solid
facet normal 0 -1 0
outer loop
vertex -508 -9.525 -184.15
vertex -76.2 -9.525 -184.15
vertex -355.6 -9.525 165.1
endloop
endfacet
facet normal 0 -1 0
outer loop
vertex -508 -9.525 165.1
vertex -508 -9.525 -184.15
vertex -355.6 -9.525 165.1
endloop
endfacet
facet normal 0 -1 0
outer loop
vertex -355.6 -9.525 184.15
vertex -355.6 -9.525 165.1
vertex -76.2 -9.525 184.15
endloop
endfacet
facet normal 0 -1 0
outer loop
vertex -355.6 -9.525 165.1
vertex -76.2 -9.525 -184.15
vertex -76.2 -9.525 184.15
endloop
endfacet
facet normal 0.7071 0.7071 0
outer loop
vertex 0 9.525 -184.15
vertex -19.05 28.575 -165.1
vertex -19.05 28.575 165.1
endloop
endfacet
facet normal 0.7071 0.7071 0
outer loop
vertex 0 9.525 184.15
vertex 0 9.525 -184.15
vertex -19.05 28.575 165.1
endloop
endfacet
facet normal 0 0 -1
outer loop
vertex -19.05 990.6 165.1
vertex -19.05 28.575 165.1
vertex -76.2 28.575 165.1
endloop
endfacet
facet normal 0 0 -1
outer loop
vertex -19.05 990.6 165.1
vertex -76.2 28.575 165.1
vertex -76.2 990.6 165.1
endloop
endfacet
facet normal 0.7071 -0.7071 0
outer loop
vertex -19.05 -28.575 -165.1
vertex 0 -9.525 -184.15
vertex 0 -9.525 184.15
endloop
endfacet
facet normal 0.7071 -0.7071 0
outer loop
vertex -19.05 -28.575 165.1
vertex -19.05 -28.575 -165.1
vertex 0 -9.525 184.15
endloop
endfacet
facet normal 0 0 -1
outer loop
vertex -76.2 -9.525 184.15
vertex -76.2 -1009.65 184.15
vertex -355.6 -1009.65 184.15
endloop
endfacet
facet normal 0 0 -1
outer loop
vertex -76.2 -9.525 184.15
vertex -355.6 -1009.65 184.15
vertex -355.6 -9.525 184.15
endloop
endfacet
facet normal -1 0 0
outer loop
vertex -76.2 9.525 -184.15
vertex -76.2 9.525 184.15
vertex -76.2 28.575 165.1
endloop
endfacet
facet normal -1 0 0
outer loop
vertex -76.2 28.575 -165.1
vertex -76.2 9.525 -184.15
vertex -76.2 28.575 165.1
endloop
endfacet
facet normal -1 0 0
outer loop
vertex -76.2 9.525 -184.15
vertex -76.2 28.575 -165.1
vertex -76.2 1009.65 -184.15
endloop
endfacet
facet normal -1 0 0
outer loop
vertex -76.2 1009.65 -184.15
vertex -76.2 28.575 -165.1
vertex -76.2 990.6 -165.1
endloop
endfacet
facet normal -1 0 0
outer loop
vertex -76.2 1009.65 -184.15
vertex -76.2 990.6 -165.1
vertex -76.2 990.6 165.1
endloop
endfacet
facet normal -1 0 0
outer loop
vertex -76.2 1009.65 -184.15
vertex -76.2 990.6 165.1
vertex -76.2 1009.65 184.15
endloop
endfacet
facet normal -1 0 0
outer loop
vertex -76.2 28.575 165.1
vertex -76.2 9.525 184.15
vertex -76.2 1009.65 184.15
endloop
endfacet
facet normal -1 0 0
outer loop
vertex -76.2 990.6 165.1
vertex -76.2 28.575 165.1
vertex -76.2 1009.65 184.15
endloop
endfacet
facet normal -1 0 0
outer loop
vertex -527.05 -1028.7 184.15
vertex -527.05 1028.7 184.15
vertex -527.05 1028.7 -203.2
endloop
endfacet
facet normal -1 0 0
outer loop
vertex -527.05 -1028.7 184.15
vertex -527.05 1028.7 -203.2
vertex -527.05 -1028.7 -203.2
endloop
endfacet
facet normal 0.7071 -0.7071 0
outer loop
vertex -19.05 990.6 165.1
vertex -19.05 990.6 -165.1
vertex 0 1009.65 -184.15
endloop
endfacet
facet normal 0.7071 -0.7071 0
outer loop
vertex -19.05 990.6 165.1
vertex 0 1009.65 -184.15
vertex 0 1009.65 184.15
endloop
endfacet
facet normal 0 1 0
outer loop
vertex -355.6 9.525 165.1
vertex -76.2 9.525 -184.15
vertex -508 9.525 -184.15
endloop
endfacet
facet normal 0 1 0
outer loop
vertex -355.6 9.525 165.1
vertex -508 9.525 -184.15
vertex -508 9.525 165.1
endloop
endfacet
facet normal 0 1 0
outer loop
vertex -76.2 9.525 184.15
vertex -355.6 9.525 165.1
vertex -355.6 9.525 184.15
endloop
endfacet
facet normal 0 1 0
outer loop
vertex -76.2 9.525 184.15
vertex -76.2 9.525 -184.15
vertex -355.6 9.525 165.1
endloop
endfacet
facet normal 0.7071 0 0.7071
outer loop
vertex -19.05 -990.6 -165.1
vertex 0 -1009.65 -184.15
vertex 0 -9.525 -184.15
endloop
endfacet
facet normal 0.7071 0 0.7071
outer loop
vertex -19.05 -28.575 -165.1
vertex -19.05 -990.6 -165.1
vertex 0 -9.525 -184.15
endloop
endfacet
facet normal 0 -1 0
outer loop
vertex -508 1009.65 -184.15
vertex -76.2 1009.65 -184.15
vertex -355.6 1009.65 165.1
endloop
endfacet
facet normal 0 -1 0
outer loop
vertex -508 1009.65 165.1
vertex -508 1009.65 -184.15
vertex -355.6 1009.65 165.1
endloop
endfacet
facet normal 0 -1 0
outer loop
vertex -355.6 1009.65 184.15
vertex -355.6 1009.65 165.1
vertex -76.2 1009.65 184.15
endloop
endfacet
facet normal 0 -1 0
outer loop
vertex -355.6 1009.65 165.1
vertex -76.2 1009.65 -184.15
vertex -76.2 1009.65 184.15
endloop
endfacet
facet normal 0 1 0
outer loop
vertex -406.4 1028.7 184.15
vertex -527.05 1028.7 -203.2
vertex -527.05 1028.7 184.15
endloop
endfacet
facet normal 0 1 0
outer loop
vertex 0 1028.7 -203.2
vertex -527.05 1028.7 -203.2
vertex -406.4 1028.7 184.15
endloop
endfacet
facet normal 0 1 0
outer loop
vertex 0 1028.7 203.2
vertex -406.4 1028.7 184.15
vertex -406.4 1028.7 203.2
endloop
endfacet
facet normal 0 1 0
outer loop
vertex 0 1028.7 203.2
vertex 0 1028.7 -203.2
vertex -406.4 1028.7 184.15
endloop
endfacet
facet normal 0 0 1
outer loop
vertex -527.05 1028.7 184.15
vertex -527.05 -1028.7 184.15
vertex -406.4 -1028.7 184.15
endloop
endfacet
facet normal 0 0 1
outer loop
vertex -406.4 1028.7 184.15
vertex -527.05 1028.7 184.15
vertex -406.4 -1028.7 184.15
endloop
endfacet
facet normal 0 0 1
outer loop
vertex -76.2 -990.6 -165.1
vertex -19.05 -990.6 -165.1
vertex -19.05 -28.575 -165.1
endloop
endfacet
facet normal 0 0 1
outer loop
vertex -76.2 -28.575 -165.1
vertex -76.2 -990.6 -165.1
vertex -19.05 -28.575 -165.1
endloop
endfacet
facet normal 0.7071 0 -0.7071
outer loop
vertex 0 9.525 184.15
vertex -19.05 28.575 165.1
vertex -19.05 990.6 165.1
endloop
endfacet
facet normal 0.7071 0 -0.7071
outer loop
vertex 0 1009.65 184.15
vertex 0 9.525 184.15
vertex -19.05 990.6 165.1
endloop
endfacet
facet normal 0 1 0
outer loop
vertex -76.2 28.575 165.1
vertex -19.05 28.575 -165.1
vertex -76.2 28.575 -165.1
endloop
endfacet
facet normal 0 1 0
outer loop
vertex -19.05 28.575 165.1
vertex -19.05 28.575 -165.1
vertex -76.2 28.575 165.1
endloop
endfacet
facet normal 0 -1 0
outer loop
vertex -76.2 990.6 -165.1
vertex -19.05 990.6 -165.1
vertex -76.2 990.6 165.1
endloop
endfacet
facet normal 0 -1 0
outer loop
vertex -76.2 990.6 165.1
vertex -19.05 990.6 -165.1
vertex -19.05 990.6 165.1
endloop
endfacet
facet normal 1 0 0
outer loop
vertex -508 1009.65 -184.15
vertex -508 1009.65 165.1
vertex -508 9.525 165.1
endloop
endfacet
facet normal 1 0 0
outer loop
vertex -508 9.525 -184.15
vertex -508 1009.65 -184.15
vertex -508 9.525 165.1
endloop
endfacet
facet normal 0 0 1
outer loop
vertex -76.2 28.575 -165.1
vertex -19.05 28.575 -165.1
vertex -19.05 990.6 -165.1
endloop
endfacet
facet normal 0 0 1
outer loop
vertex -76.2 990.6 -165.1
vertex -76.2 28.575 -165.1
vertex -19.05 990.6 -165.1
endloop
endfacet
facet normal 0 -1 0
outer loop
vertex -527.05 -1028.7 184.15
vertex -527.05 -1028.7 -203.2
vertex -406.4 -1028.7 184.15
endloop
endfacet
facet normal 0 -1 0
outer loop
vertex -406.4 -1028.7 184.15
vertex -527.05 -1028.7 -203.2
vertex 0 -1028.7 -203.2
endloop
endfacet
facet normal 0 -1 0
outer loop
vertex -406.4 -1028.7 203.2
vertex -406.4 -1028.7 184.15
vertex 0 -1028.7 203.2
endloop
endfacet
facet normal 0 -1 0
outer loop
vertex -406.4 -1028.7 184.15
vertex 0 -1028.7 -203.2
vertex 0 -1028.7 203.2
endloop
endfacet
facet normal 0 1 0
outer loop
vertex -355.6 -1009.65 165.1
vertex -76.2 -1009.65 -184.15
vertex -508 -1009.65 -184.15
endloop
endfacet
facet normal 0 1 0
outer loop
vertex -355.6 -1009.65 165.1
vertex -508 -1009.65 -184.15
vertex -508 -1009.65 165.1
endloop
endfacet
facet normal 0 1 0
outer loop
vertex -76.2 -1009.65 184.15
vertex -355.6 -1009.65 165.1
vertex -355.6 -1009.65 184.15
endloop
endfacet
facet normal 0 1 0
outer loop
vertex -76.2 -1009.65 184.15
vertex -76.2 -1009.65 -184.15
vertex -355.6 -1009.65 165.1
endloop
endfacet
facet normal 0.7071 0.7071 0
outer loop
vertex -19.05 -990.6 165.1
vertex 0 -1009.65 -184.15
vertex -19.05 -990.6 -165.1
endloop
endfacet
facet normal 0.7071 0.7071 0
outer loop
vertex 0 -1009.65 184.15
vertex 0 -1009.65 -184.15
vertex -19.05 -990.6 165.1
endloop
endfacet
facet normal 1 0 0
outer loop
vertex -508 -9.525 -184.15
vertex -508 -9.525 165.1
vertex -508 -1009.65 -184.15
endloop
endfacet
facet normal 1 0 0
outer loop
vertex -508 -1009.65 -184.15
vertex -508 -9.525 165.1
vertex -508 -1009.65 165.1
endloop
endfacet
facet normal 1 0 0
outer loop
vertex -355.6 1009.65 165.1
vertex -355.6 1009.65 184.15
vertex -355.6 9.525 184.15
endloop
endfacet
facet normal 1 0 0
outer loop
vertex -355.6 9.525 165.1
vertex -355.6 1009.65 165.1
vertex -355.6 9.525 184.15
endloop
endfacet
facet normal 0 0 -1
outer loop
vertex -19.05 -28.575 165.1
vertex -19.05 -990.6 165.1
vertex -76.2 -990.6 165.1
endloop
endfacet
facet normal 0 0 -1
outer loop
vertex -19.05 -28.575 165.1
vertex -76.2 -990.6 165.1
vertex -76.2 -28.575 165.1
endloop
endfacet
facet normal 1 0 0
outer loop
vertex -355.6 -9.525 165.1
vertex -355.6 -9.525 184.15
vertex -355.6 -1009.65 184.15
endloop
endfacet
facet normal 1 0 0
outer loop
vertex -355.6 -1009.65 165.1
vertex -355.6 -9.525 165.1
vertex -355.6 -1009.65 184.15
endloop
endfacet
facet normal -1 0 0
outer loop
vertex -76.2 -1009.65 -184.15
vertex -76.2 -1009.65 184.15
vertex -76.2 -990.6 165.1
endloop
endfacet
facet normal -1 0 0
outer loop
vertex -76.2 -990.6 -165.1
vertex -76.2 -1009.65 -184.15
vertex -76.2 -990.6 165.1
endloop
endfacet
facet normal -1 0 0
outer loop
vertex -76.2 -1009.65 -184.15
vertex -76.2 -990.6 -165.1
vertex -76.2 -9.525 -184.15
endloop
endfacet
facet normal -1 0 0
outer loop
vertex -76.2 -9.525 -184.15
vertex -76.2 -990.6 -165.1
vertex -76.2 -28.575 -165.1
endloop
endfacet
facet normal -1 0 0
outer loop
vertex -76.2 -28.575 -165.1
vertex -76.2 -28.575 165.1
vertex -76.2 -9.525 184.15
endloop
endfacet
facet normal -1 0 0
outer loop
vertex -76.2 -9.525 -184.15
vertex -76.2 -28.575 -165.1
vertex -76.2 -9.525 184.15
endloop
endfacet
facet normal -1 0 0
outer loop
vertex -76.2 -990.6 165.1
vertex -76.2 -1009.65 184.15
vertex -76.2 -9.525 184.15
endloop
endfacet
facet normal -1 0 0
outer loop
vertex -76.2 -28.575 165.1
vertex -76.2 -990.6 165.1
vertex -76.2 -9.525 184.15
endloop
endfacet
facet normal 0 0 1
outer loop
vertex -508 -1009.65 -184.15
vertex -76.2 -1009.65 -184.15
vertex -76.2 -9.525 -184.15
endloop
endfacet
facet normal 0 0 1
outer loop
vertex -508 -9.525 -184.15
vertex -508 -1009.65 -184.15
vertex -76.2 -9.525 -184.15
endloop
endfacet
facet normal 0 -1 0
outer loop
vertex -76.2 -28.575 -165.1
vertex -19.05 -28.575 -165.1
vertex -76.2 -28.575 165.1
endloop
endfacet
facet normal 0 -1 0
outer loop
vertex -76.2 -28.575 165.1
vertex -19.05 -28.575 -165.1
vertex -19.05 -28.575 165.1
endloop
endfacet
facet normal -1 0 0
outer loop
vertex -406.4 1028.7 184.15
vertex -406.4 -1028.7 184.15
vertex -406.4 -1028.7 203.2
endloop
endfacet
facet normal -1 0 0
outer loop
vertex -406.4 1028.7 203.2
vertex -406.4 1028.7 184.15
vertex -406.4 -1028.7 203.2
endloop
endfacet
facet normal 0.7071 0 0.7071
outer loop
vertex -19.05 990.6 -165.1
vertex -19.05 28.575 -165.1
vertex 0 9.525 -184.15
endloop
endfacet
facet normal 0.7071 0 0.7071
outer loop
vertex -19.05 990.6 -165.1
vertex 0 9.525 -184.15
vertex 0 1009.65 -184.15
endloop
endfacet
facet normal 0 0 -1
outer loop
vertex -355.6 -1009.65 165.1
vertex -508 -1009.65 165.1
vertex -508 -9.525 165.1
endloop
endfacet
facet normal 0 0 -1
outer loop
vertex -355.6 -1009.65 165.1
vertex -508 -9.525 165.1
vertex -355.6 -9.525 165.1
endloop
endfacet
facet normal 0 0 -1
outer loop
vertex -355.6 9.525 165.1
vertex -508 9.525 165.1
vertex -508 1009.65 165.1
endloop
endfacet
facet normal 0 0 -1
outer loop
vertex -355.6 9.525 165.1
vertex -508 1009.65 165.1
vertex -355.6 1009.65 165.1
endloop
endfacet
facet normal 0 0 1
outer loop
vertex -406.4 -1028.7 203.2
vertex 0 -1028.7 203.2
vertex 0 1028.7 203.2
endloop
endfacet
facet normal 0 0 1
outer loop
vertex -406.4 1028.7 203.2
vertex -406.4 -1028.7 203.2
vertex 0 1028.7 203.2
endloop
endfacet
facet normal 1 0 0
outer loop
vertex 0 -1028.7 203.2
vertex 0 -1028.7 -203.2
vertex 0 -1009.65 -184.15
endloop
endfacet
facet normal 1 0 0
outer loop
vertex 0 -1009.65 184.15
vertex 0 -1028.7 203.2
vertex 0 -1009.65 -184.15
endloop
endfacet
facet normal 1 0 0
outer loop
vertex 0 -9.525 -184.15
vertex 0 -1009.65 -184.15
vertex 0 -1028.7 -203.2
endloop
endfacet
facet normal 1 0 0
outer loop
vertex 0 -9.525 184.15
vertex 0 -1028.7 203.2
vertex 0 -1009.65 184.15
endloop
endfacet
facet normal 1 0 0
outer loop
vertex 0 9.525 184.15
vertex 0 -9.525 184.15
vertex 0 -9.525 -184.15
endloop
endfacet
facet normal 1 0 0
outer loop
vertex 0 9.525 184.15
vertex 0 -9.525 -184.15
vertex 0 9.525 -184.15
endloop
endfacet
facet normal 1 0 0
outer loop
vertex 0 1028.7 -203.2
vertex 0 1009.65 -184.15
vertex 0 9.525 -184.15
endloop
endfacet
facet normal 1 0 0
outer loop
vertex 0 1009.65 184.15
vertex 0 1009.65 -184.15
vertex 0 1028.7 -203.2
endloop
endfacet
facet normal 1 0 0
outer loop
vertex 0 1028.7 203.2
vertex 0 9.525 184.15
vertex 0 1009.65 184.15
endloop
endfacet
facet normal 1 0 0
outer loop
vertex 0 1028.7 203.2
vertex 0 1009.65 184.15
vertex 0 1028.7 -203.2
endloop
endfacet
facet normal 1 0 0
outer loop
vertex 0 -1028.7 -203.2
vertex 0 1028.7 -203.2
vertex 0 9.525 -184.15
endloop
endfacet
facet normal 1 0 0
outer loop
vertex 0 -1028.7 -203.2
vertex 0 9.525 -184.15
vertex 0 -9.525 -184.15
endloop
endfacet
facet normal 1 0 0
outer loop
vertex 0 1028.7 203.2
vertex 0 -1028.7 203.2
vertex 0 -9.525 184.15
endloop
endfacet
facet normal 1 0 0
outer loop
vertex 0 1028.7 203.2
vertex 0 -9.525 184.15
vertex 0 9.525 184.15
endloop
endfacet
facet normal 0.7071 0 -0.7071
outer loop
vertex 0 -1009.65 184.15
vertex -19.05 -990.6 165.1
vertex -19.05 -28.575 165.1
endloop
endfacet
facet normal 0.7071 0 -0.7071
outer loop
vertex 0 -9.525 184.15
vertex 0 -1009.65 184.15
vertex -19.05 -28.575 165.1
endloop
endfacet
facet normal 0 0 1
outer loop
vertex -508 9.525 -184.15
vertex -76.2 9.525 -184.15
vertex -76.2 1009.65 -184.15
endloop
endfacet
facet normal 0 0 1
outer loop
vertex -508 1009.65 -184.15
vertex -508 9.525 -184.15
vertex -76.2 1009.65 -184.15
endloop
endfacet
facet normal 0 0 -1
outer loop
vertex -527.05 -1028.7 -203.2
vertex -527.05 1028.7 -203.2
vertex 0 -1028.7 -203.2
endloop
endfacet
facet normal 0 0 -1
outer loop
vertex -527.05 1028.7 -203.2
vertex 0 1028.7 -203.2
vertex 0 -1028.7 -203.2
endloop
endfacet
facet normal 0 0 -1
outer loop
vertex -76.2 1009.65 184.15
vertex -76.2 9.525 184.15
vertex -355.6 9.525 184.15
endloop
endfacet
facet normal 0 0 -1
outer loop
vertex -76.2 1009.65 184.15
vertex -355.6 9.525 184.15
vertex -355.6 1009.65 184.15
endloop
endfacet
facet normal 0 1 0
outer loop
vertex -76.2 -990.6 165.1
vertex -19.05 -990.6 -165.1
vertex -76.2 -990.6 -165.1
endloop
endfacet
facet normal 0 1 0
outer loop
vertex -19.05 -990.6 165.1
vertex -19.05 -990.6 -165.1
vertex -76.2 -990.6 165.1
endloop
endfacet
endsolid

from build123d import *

# Parameters (mm, degrees)
F0_W     = 2057.4
F0_H     = 406.4
F0_W_2   = 1000.125
F0_H_2   = 368.3
F1_DEPTH = 508
F2_W     = 101.6
F2_H     = 19.05
F3_DEPTH = 2057.401
F4_W     = 2057.4
F4_H     = 387.35
F5_DEPTH = 19.05
F6_W     = 152.4
F6_H     = 1009.65
F6_H_2   = 1000.125
F7_DEPTH = 19.05
F8_W     = 1000.125
F8_H     = 368.3
F8_W_2   = 962.025
F8_H_2   = 330.2
F9_DEPTH = 76.2
F10_SIZE = 19.05


with BuildPart() as f1:
    # F0 (on Right) → F1 (new body)
    with BuildSketch(Plane.YZ):
        Rectangle(F0_W, F0_H)
        with Locations((-509.5875, 0)):
            Rectangle(F0_W_2, F0_H_2, mode=Mode.SUBTRACT)
        with Locations((509.5875, 0)):
            Rectangle(F0_W_2, F0_H_2, mode=Mode.SUBTRACT)
    extrude(amount=-F1_DEPTH)

    # F2 (on face) → F3 (cut, through all)
    with BuildSketch(Plane.XZ.offset(1028.7)):
        with Locations((-457.2, 193.675)):
            Rectangle(F2_W, F2_H)
    extrude(amount=-F3_DEPTH, mode=Mode.SUBTRACT)

    # F4 (on face) → F5 (join)
    with BuildSketch(Plane(origin=(-508, 0, 0), x_dir=(0, -1, 0), z_dir=(-1, 0, 0))):
        with Locations((0, -9.525)):
            Rectangle(F4_W, F4_H)
    extrude(amount=F5_DEPTH)

    # F6 (on face) → F7 (join)
    with BuildSketch(Plane(origin=(0, 0, 184.15), x_dir=(1, 0, 0), z_dir=(0, 0, -1))):
        with Locations((-431.8, -504.825)):
            Rectangle(F6_W, F6_H)
        with Locations((-431.8, 509.5875)):
            Rectangle(F6_W, F6_H_2)
    extrude(amount=F7_DEPTH)

    # F8 (on face) → F9 (join)
    with BuildSketch(Plane.YZ):
        with Locations((-509.5875, 0)):
            Rectangle(F8_W, F8_H)
        with Locations((-509.5875, 0)):
            Rectangle(F8_W_2, F8_H_2, mode=Mode.SUBTRACT)
        with Locations((509.5875, 0)):
            Rectangle(F8_W, F8_H)
        with Locations((509.5875, 0)):
            Rectangle(F8_W_2, F8_H_2, mode=Mode.SUBTRACT)
    extrude(amount=-F9_DEPTH)

    # F10
    f10_edges = [f1.edges().sort_by_distance(p)[0] for p in [
        (0, -509.5875, 165.1),
        (0, -990.6, 0),
        (0, -509.5875, -165.1),
        (0, -28.575, 0),
        (0, 509.5875, -165.1),
        (0, 28.575, 0),
        (0, 509.5875, 165.1),
        (0, 990.6, 0),
    ]]
    chamfer(f10_edges, length=F10_SIZE)


solid = f1.part
